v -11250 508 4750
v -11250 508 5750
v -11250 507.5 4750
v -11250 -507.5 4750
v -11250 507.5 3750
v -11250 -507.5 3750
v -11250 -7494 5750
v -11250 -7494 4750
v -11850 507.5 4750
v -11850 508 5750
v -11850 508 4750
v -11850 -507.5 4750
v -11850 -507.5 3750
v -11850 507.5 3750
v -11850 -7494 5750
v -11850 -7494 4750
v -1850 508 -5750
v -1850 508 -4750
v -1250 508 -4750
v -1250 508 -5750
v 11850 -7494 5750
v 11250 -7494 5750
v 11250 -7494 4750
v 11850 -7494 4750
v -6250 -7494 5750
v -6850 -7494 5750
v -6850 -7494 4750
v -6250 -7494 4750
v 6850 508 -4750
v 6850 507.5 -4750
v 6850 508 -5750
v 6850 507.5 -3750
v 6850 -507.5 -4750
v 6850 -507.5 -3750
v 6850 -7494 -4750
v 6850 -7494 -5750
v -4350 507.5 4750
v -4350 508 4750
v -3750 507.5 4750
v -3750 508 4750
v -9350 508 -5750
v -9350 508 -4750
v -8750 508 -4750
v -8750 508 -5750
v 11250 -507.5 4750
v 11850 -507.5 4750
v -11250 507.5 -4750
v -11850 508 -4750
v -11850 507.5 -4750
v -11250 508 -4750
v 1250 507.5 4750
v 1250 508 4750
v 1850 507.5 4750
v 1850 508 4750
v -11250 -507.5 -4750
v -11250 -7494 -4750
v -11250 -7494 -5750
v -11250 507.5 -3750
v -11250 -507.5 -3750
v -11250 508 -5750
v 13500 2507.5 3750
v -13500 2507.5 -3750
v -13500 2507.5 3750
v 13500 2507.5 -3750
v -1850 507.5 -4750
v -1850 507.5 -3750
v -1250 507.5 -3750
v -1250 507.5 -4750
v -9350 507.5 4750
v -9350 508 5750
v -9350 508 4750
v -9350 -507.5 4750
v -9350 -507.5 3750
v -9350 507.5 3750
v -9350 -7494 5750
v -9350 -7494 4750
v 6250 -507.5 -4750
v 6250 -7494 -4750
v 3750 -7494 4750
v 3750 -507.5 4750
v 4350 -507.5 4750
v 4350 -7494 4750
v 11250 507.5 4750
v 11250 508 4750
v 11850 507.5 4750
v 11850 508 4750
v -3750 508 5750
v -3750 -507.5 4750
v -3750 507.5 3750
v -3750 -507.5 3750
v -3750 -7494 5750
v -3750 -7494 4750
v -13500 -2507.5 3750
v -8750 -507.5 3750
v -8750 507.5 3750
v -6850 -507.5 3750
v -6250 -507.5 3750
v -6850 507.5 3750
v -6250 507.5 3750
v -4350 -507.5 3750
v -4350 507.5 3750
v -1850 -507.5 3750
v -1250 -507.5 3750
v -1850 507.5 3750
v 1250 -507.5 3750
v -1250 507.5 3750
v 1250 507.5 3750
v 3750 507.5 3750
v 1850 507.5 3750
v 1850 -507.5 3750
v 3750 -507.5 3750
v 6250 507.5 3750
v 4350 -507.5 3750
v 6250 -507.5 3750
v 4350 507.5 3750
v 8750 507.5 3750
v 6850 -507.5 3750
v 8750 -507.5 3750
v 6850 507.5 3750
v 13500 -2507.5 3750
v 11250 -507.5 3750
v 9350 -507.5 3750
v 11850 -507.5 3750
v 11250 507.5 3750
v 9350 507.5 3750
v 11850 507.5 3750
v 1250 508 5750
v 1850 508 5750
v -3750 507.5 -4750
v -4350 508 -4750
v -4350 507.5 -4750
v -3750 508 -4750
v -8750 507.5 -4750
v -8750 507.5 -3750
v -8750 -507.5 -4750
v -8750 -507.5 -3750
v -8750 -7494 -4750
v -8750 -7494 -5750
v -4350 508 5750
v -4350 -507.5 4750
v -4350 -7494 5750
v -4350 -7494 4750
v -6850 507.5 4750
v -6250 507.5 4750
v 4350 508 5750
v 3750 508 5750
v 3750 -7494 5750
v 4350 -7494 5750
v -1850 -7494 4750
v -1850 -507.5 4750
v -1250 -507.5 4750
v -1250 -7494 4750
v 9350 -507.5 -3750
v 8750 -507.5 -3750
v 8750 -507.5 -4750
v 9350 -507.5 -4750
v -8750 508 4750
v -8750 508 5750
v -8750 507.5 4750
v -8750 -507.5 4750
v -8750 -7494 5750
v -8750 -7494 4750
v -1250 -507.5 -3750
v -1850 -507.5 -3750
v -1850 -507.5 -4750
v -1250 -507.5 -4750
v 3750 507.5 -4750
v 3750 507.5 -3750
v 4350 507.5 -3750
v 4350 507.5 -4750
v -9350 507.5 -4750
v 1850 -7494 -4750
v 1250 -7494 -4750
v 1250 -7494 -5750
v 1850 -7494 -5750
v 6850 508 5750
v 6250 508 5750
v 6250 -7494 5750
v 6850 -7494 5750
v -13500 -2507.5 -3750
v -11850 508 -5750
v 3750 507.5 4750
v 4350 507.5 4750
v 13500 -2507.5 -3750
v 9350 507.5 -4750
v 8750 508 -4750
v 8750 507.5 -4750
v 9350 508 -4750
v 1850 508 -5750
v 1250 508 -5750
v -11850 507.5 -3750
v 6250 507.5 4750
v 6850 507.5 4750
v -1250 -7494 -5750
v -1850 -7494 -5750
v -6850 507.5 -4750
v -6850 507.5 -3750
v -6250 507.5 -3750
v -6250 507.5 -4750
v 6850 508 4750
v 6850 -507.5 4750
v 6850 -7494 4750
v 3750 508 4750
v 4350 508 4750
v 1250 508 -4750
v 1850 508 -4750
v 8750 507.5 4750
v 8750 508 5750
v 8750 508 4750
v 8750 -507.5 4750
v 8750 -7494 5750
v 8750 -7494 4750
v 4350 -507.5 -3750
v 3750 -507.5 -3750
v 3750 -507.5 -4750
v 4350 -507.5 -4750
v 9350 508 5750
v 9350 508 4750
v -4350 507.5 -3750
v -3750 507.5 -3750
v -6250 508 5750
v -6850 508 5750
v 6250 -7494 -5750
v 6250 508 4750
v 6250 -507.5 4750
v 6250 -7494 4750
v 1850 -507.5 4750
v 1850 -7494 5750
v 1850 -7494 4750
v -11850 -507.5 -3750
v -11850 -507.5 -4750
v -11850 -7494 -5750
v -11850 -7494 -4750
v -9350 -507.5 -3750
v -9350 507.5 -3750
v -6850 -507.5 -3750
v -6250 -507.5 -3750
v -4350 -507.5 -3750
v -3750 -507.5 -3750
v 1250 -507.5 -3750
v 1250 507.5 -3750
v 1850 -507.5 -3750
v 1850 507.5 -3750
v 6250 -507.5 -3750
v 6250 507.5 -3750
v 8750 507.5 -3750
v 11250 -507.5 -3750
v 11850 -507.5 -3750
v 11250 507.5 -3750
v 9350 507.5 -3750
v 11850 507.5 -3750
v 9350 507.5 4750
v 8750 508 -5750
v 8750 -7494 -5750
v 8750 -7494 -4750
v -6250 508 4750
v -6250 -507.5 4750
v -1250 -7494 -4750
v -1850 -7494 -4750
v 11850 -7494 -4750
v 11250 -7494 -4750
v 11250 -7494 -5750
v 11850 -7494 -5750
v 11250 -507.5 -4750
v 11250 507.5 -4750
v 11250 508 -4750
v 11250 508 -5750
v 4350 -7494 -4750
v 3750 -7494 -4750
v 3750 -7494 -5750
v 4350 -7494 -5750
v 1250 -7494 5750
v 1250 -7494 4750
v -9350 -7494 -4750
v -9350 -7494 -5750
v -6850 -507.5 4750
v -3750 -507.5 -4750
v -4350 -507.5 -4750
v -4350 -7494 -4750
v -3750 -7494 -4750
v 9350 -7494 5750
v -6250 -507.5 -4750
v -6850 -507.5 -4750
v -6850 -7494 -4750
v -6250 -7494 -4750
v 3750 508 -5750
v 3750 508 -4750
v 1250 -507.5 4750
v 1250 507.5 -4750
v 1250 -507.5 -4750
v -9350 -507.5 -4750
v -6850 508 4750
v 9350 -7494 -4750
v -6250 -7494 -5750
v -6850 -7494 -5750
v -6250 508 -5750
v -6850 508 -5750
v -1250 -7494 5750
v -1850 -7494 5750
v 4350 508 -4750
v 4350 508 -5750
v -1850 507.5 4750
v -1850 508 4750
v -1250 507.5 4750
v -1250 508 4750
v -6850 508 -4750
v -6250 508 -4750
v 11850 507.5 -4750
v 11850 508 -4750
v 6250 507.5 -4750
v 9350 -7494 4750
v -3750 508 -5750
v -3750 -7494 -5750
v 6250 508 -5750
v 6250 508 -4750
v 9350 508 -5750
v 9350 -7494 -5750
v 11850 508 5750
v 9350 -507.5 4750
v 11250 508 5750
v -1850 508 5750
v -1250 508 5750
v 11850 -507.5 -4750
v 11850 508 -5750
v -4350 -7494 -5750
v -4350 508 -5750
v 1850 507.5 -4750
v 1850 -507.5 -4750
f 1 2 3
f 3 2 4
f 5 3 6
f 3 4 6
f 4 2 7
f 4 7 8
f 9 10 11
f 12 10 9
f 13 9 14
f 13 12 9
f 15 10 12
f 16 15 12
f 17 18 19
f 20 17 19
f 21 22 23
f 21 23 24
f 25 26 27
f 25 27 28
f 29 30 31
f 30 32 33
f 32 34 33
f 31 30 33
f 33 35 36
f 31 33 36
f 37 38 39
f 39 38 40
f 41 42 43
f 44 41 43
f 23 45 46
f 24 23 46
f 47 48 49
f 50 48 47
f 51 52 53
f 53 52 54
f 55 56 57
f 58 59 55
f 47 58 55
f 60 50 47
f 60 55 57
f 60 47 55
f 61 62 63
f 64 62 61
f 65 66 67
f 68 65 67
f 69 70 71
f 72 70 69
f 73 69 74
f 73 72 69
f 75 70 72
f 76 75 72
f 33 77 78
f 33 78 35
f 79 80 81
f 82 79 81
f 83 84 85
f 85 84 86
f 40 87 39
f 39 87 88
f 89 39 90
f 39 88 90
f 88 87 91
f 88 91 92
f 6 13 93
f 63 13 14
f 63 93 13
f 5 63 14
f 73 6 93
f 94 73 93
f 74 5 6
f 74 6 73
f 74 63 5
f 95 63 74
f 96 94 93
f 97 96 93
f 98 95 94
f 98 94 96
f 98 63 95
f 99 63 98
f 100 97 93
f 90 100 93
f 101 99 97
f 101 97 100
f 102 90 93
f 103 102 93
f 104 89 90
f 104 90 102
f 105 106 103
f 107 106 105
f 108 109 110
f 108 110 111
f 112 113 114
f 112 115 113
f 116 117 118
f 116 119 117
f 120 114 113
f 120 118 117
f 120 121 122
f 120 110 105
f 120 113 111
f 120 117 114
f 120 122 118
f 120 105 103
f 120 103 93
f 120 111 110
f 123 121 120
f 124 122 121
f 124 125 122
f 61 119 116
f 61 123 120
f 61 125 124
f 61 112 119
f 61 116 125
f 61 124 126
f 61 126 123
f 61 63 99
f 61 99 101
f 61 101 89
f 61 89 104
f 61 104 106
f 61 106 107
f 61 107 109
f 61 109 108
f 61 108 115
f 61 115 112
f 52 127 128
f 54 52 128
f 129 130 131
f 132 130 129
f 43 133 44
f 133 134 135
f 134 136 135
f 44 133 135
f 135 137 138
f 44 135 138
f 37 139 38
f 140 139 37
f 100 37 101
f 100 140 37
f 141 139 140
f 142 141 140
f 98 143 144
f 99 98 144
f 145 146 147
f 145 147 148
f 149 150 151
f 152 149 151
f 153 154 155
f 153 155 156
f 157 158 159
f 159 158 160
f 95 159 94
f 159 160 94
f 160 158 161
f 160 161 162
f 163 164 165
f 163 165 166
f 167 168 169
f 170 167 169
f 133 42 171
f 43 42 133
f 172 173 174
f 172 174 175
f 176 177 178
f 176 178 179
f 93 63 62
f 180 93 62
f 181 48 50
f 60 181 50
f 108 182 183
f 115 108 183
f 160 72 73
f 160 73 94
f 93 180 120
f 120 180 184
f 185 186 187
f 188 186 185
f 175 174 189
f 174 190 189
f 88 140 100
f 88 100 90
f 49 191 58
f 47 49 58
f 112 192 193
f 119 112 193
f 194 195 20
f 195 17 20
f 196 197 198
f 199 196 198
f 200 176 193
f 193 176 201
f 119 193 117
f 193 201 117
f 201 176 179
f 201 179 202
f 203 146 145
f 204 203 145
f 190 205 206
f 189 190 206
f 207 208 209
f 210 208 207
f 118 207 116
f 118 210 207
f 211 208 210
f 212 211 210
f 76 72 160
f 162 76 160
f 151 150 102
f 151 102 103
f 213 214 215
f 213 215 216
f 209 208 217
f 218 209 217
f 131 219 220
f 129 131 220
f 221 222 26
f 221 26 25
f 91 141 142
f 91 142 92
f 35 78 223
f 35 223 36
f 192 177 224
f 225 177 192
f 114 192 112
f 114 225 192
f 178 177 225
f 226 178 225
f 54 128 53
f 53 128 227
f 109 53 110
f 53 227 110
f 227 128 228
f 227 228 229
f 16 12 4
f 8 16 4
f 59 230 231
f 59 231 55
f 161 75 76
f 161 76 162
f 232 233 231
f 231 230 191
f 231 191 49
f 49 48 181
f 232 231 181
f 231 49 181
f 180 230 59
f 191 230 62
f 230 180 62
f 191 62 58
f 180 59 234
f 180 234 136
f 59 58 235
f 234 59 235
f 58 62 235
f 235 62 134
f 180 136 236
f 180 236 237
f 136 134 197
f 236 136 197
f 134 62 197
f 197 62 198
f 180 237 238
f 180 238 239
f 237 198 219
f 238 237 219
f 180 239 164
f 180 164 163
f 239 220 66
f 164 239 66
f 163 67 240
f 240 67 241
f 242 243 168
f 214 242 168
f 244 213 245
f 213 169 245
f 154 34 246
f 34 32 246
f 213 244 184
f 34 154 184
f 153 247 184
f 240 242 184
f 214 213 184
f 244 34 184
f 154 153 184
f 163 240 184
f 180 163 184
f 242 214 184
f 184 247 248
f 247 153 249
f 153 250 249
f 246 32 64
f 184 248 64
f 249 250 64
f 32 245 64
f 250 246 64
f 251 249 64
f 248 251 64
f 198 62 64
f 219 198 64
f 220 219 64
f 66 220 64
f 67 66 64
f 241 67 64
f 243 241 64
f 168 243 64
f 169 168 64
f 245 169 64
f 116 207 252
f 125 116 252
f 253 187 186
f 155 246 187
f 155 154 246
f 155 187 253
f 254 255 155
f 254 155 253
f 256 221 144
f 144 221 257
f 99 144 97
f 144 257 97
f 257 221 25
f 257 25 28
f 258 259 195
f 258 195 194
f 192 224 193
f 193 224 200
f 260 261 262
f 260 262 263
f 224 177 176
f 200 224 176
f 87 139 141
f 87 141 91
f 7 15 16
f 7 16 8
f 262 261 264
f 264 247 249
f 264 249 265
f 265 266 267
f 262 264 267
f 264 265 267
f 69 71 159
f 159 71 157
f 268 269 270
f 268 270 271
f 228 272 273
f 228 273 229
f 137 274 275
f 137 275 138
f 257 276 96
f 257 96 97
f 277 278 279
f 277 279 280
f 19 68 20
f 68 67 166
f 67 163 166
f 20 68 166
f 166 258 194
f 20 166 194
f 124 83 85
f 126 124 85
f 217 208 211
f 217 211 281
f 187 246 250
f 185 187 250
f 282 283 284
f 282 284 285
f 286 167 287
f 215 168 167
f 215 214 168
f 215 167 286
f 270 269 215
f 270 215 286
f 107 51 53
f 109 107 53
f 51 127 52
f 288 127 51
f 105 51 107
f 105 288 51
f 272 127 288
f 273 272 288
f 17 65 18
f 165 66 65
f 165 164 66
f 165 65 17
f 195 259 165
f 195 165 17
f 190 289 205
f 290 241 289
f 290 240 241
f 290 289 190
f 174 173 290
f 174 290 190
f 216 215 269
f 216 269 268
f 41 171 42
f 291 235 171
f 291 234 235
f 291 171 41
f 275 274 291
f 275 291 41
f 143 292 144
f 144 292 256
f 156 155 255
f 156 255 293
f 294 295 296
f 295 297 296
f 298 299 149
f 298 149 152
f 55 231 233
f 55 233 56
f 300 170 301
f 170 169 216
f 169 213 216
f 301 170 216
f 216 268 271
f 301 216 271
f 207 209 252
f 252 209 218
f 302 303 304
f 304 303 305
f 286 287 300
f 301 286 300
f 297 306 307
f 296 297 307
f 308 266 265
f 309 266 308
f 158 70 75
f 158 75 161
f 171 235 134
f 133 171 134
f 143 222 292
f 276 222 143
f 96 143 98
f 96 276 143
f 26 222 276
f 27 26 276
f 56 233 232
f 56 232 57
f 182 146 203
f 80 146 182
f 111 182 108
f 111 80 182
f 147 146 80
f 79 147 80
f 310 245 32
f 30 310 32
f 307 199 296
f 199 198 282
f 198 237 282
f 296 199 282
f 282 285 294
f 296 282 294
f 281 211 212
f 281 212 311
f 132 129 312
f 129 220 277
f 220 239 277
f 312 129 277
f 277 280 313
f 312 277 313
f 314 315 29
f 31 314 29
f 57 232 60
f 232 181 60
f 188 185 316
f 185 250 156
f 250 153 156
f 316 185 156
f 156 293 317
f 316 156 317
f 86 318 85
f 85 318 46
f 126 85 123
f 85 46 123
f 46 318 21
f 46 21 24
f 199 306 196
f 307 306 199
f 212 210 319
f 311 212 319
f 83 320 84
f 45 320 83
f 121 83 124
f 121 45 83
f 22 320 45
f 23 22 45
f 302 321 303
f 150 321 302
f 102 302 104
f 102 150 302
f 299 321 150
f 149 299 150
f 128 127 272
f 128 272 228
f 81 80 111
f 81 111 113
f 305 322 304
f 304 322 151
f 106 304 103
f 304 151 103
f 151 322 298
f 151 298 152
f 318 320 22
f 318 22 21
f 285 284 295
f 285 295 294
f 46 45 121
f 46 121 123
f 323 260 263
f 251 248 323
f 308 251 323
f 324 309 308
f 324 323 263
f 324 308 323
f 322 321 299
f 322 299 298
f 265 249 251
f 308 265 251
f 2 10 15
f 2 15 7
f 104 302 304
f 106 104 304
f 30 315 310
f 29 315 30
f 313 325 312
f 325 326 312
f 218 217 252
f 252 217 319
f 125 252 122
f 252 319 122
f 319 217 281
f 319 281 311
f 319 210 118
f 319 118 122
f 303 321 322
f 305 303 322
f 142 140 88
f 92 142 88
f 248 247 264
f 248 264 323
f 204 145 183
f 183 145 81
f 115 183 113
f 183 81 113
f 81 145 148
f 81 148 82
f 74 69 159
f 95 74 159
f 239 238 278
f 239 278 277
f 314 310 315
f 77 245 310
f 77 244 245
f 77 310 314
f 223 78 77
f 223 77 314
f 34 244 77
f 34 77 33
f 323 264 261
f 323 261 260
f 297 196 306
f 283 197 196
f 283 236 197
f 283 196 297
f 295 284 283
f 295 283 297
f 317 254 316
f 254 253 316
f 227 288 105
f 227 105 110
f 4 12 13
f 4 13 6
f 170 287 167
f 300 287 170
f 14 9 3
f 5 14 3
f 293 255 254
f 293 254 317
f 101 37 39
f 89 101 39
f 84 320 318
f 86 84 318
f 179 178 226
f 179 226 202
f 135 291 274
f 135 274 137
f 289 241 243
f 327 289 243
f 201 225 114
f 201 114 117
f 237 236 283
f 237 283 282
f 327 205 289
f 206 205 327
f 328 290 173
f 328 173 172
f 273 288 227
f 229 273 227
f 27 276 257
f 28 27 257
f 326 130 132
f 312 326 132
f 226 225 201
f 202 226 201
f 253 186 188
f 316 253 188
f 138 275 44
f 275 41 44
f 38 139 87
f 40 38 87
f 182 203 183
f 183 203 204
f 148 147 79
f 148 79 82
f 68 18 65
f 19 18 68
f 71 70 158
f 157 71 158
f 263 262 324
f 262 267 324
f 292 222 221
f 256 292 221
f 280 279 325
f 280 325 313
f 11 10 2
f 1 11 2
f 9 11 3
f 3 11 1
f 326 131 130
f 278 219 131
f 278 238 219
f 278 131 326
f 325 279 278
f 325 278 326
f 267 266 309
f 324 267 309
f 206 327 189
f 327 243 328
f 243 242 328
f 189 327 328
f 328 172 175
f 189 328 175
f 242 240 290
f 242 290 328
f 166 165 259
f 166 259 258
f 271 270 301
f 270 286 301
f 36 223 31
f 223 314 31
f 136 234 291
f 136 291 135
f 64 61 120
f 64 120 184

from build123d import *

# Parameters (mm, degrees)
BOSS_EXTRUDE3_DEPTH         = 2507.5
BOSS_EXTRUDE6_DEPTH         = 508
BOSS_EXTRUDE6_DEPTH_BACK    = 7494
SKETCH1_14_W                = 600
SKETCH1_14_H                = 1000
BOSS_EXTRUDE6_2_DEPTH       = 508
BOSS_EXTRUDE6_2_DEPTH_BACK  = 7494
BOSS_EXTRUDE6_3_DEPTH       = 508
BOSS_EXTRUDE6_3_DEPTH_BACK  = 7494
BOSS_EXTRUDE6_4_DEPTH       = 508
BOSS_EXTRUDE6_4_DEPTH_BACK  = 7494
BOSS_EXTRUDE6_5_DEPTH       = 508
BOSS_EXTRUDE6_5_DEPTH_BACK  = 7494
BOSS_EXTRUDE6_6_DEPTH       = 508
BOSS_EXTRUDE6_6_DEPTH_BACK  = 7494
BOSS_EXTRUDE6_7_DEPTH       = 508
BOSS_EXTRUDE6_7_DEPTH_BACK  = 7494
BOSS_EXTRUDE6_8_DEPTH       = 508
BOSS_EXTRUDE6_8_DEPTH_BACK  = 7494
BOSS_EXTRUDE6_9_DEPTH       = 508
BOSS_EXTRUDE6_9_DEPTH_BACK  = 7494
BOSS_EXTRUDE6_10_DEPTH      = 508
BOSS_EXTRUDE6_10_DEPTH_BACK = 7494
BOSS_EXTRUDE6_11_DEPTH      = 508
BOSS_EXTRUDE6_11_DEPTH_BACK = 7494
BOSS_EXTRUDE6_12_DEPTH      = 508
BOSS_EXTRUDE6_12_DEPTH_BACK = 7494
BOSS_EXTRUDE6_13_DEPTH      = 508
BOSS_EXTRUDE6_13_DEPTH_BACK = 7494
BOSS_EXTRUDE6_14_DEPTH      = 508
BOSS_EXTRUDE6_14_DEPTH_BACK = 7494
BOSS_EXTRUDE6_15_DEPTH      = 508
BOSS_EXTRUDE6_15_DEPTH_BACK = 7494
BOSS_EXTRUDE6_16_DEPTH      = 508
BOSS_EXTRUDE6_16_DEPTH_BACK = 7494
BOSS_EXTRUDE6_17_DEPTH      = 508
BOSS_EXTRUDE6_17_DEPTH_BACK = 7494
BOSS_EXTRUDE6_18_DEPTH      = 508
BOSS_EXTRUDE6_18_DEPTH_BACK = 7494
BOSS_EXTRUDE6_19_DEPTH      = 508
BOSS_EXTRUDE6_19_DEPTH_BACK = 7494
BOSS_EXTRUDE6_20_DEPTH      = 508
BOSS_EXTRUDE6_20_DEPTH_BACK = 7494
SKETCH1_17_W                = 600
SKETCH1_17_H                = 1000
BOSS_EXTRUDE8_DEPTH         = 507.5


with BuildPart() as part:
    # Sketch1 → Boss-Extrude3 (new, symmetric)
    with BuildSketch(Plane(origin=(0, 0, 0), x_dir=(1, 0, 0), z_dir=(0, 1, 0))):
        Polygon((-13500, 3750), (-13500, -3750), (-11850, -3750), (-11250, -3750), (-9350, -3750), (-8750, -3750), (-6850, -3750), (-6250, -3750), (-4350, -3750), (-3750, -3750), (-1850, -3750), (-1250, -3750), (1250, -3750), (1850, -3750), (3750, -3750), (4350, -3750), (6250, -3750), (6850, -3750), (8750, -3750), (9350, -3750), (11250, -3750), (11850, -3750), (13500, -3750), (13500, 3750), (11850, 3750), (11250, 3750), (9350, 3750), (8750, 3750), (6850, 3750), (6250, 3750), (4350, 3750), (3750, 3750), (1850, 3750), (1250, 3750), (-1250, 3750), (-1850, 3750), (-3750, 3750), (-4350, 3750), (-6250, 3750), (-6850, 3750), (-8750, 3750), (-9350, 3750), (-11250, 3750), (-11850, 3750), align=None)
    extrude(amount=BOSS_EXTRUDE3_DEPTH, both=True)



with BuildPart() as body_2:
    # Sketch1<14> → Boss-Extrude6 (new, two sides: drawn at the far end of the back side and taken through both)
    with BuildSketch(Plane(origin=(0, 0, 0), x_dir=(1, 0, 0), z_dir=(0, 1, 0)).offset(-BOSS_EXTRUDE6_DEPTH_BACK)):
        with Locations((-11550, -5250)):
            Rectangle(SKETCH1_14_W, SKETCH1_14_H)
    extrude(amount=BOSS_EXTRUDE6_DEPTH + BOSS_EXTRUDE6_DEPTH_BACK)


with BuildPart() as body_3:
    # Sketch1<14> → Boss-Extrude6 2 (new, two sides: drawn at the far end of the back side and taken through both)
    with BuildSketch(Plane(origin=(0, 0, 0), x_dir=(1, 0, 0), z_dir=(0, 1, 0)).offset(-BOSS_EXTRUDE6_2_DEPTH_BACK)):
        with Locations((-11550, 5250)):
            Rectangle(SKETCH1_14_W, SKETCH1_14_H)
    extrude(amount=BOSS_EXTRUDE6_2_DEPTH + BOSS_EXTRUDE6_2_DEPTH_BACK)


with BuildPart() as body_4:
    # Sketch1<14> → Boss-Extrude6 3 (new, two sides: drawn at the far end of the back side and taken through both)
    with BuildSketch(Plane(origin=(0, 0, 0), x_dir=(1, 0, 0), z_dir=(0, 1, 0)).offset(-BOSS_EXTRUDE6_3_DEPTH_BACK)):
        with Locations((-9050, -5250)):
            Rectangle(SKETCH1_14_W, SKETCH1_14_H)
    extrude(amount=BOSS_EXTRUDE6_3_DEPTH + BOSS_EXTRUDE6_3_DEPTH_BACK)


with BuildPart() as body_5:
    # Sketch1<14> → Boss-Extrude6 4 (new, two sides: drawn at the far end of the back side and taken through both)
    with BuildSketch(Plane(origin=(0, 0, 0), x_dir=(1, 0, 0), z_dir=(0, 1, 0)).offset(-BOSS_EXTRUDE6_4_DEPTH_BACK)):
        with Locations((-9050, 5250)):
            Rectangle(SKETCH1_14_W, SKETCH1_14_H)
    extrude(amount=BOSS_EXTRUDE6_4_DEPTH + BOSS_EXTRUDE6_4_DEPTH_BACK)


with BuildPart() as body_6:
    # Sketch1<14> → Boss-Extrude6 5 (new, two sides: drawn at the far end of the back side and taken through both)
    with BuildSketch(Plane(origin=(0, 0, 0), x_dir=(1, 0, 0), z_dir=(0, 1, 0)).offset(-BOSS_EXTRUDE6_5_DEPTH_BACK)):
        with Locations((-6550, -5250)):
            Rectangle(SKETCH1_14_W, SKETCH1_14_H)
    extrude(amount=BOSS_EXTRUDE6_5_DEPTH + BOSS_EXTRUDE6_5_DEPTH_BACK)


with BuildPart() as body_7:
    # Sketch1<14> → Boss-Extrude6 6 (new, two sides: drawn at the far end of the back side and taken through both)
    with BuildSketch(Plane(origin=(0, 0, 0), x_dir=(1, 0, 0), z_dir=(0, 1, 0)).offset(-BOSS_EXTRUDE6_6_DEPTH_BACK)):
        with Locations((-6550, 5250)):
            Rectangle(SKETCH1_14_W, SKETCH1_14_H)
    extrude(amount=BOSS_EXTRUDE6_6_DEPTH + BOSS_EXTRUDE6_6_DEPTH_BACK)


with BuildPart() as body_8:
    # Sketch1<14> → Boss-Extrude6 7 (new, two sides: drawn at the far end of the back side and taken through both)
    with BuildSketch(Plane(origin=(0, 0, 0), x_dir=(1, 0, 0), z_dir=(0, 1, 0)).offset(-BOSS_EXTRUDE6_7_DEPTH_BACK)):
        with Locations((-4050, -5250)):
            Rectangle(SKETCH1_14_W, SKETCH1_14_H)
    extrude(amount=BOSS_EXTRUDE6_7_DEPTH + BOSS_EXTRUDE6_7_DEPTH_BACK)


with BuildPart() as body_9:
    # Sketch1<14> → Boss-Extrude6 8 (new, two sides: drawn at the far end of the back side and taken through both)
    with BuildSketch(Plane(origin=(0, 0, 0), x_dir=(1, 0, 0), z_dir=(0, 1, 0)).offset(-BOSS_EXTRUDE6_8_DEPTH_BACK)):
        with Locations((-4050, 5250)):
            Rectangle(SKETCH1_14_W, SKETCH1_14_H)
    extrude(amount=BOSS_EXTRUDE6_8_DEPTH + BOSS_EXTRUDE6_8_DEPTH_BACK)


with BuildPart() as body_10:
    # Sketch1<14> → Boss-Extrude6 9 (new, two sides: drawn at the far end of the back side and taken through both)
    with BuildSketch(Plane(origin=(0, 0, 0), x_dir=(1, 0, 0), z_dir=(0, 1, 0)).offset(-BOSS_EXTRUDE6_9_DEPTH_BACK)):
        with Locations((-1550, -5250)):
            Rectangle(SKETCH1_14_W, SKETCH1_14_H)
    extrude(amount=BOSS_EXTRUDE6_9_DEPTH + BOSS_EXTRUDE6_9_DEPTH_BACK)


with BuildPart() as body_11:
    # Sketch1<14> → Boss-Extrude6 10 (new, two sides: drawn at the far end of the back side and taken through both)
    with BuildSketch(Plane(origin=(0, 0, 0), x_dir=(1, 0, 0), z_dir=(0, 1, 0)).offset(-BOSS_EXTRUDE6_10_DEPTH_BACK)):
        with Locations((-1550, 5250)):
            Rectangle(SKETCH1_14_W, SKETCH1_14_H)
    extrude(amount=BOSS_EXTRUDE6_10_DEPTH + BOSS_EXTRUDE6_10_DEPTH_BACK)


with BuildPart() as body_12:
    # Sketch1<14> → Boss-Extrude6 11 (new, two sides: drawn at the far end of the back side and taken through both)
    with BuildSketch(Plane(origin=(0, 0, 0), x_dir=(1, 0, 0), z_dir=(0, 1, 0)).offset(-BOSS_EXTRUDE6_11_DEPTH_BACK)):
        with Locations((1550, -5250)):
            Rectangle(SKETCH1_14_W, SKETCH1_14_H)
    extrude(amount=BOSS_EXTRUDE6_11_DEPTH + BOSS_EXTRUDE6_11_DEPTH_BACK)


with BuildPart() as body_13:
    # Sketch1<14> → Boss-Extrude6 12 (new, two sides: drawn at the far end of the back side and taken through both)
    with BuildSketch(Plane(origin=(0, 0, 0), x_dir=(1, 0, 0), z_dir=(0, 1, 0)).offset(-BOSS_EXTRUDE6_12_DEPTH_BACK)):
        with Locations((1550, 5250)):
            Rectangle(SKETCH1_14_W, SKETCH1_14_H)
    extrude(amount=BOSS_EXTRUDE6_12_DEPTH + BOSS_EXTRUDE6_12_DEPTH_BACK)


with BuildPart() as body_14:
    # Sketch1<14> → Boss-Extrude6 13 (new, two sides: drawn at the far end of the back side and taken through both)
    with BuildSketch(Plane(origin=(0, 0, 0), x_dir=(1, 0, 0), z_dir=(0, 1, 0)).offset(-BOSS_EXTRUDE6_13_DEPTH_BACK)):
        with Locations((4050, -5250)):
            Rectangle(SKETCH1_14_W, SKETCH1_14_H)
    extrude(amount=BOSS_EXTRUDE6_13_DEPTH + BOSS_EXTRUDE6_13_DEPTH_BACK)


with BuildPart() as body_15:
    # Sketch1<14> → Boss-Extrude6 14 (new, two sides: drawn at the far end of the back side and taken through both)
    with BuildSketch(Plane(origin=(0, 0, 0), x_dir=(1, 0, 0), z_dir=(0, 1, 0)).offset(-BOSS_EXTRUDE6_14_DEPTH_BACK)):
        with Locations((4050, 5250)):
            Rectangle(SKETCH1_14_W, SKETCH1_14_H)
    extrude(amount=BOSS_EXTRUDE6_14_DEPTH + BOSS_EXTRUDE6_14_DEPTH_BACK)


with BuildPart() as body_16:
    # Sketch1<14> → Boss-Extrude6 15 (new, two sides: drawn at the far end of the back side and taken through both)
    with BuildSketch(Plane(origin=(0, 0, 0), x_dir=(1, 0, 0), z_dir=(0, 1, 0)).offset(-BOSS_EXTRUDE6_15_DEPTH_BACK)):
        with Locations((6550, -5250)):
            Rectangle(SKETCH1_14_W, SKETCH1_14_H)
    extrude(amount=BOSS_EXTRUDE6_15_DEPTH + BOSS_EXTRUDE6_15_DEPTH_BACK)


with BuildPart() as body_17:
    # Sketch1<14> → Boss-Extrude6 16 (new, two sides: drawn at the far end of the back side and taken through both)
    with BuildSketch(Plane(origin=(0, 0, 0), x_dir=(1, 0, 0), z_dir=(0, 1, 0)).offset(-BOSS_EXTRUDE6_16_DEPTH_BACK)):
        with Locations((6550, 5250)):
            Rectangle(SKETCH1_14_W, SKETCH1_14_H)
    extrude(amount=BOSS_EXTRUDE6_16_DEPTH + BOSS_EXTRUDE6_16_DEPTH_BACK)


with BuildPart() as body_18:
    # Sketch1<14> → Boss-Extrude6 17 (new, two sides: drawn at the far end of the back side and taken through both)
    with BuildSketch(Plane(origin=(0, 0, 0), x_dir=(1, 0, 0), z_dir=(0, 1, 0)).offset(-BOSS_EXTRUDE6_17_DEPTH_BACK)):
        with Locations((9050, -5250)):
            Rectangle(SKETCH1_14_W, SKETCH1_14_H)
    extrude(amount=BOSS_EXTRUDE6_17_DEPTH + BOSS_EXTRUDE6_17_DEPTH_BACK)


with BuildPart() as body_19:
    # Sketch1<14> → Boss-Extrude6 18 (new, two sides: drawn at the far end of the back side and taken through both)
    with BuildSketch(Plane(origin=(0, 0, 0), x_dir=(1, 0, 0), z_dir=(0, 1, 0)).offset(-BOSS_EXTRUDE6_18_DEPTH_BACK)):
        with Locations((9050, 5250)):
            Rectangle(SKETCH1_14_W, SKETCH1_14_H)
    extrude(amount=BOSS_EXTRUDE6_18_DEPTH + BOSS_EXTRUDE6_18_DEPTH_BACK)


with BuildPart() as body_20:
    # Sketch1<14> → Boss-Extrude6 19 (new, two sides: drawn at the far end of the back side and taken through both)
    with BuildSketch(Plane(origin=(0, 0, 0), x_dir=(1, 0, 0), z_dir=(0, 1, 0)).offset(-BOSS_EXTRUDE6_19_DEPTH_BACK)):
        with Locations((11550, -5250)):
            Rectangle(SKETCH1_14_W, SKETCH1_14_H)
    extrude(amount=BOSS_EXTRUDE6_19_DEPTH + BOSS_EXTRUDE6_19_DEPTH_BACK)


with BuildPart() as body_21:
    # Sketch1<14> → Boss-Extrude6 20 (new, two sides: drawn at the far end of the back side and taken through both)
    with BuildSketch(Plane(origin=(0, 0, 0), x_dir=(1, 0, 0), z_dir=(0, 1, 0)).offset(-BOSS_EXTRUDE6_20_DEPTH_BACK)):
        with Locations((11550, 5250)):
            Rectangle(SKETCH1_14_W, SKETCH1_14_H)
    extrude(amount=BOSS_EXTRUDE6_20_DEPTH + BOSS_EXTRUDE6_20_DEPTH_BACK)


with BuildPart() as part_1:
    add(part.part)

    add(body_2.part)  # Boss-Extrude8 merges body 2

    add(body_3.part)  # Boss-Extrude8 merges body 3

    add(body_4.part)  # Boss-Extrude8 merges body 4

    add(body_5.part)  # Boss-Extrude8 merges body 5

    add(body_6.part)  # Boss-Extrude8 merges body 6

    add(body_7.part)  # Boss-Extrude8 merges body 7

    add(body_8.part)  # Boss-Extrude8 merges body 8

    add(body_9.part)  # Boss-Extrude8 merges body 9

    add(body_10.part)  # Boss-Extrude8 merges body 10

    add(body_11.part)  # Boss-Extrude8 merges body 11

    add(body_12.part)  # Boss-Extrude8 merges body 12

    add(body_13.part)  # Boss-Extrude8 merges body 13

    add(body_14.part)  # Boss-Extrude8 merges body 14

    add(body_15.part)  # Boss-Extrude8 merges body 15

    add(body_16.part)  # Boss-Extrude8 merges body 16

    add(body_17.part)  # Boss-Extrude8 merges body 17

    add(body_18.part)  # Boss-Extrude8 merges body 18

    add(body_19.part)  # Boss-Extrude8 merges body 19

    add(body_20.part)  # Boss-Extrude8 merges body 20

    add(body_21.part)  # Boss-Extrude8 merges body 21
    # Sketch1<17> → Boss-Extrude8 (add, symmetric)
    with BuildSketch(Plane(origin=(0, 0, 0), x_dir=(1, 0, 0), z_dir=(0, 1, 0))):
        with Locations((-11550, -4250)):
            Rectangle(SKETCH1_17_W, SKETCH1_17_H)
        with Locations((-11550, 4250)):
            Rectangle(SKETCH1_17_W, SKETCH1_17_H)
        with Locations((-9050, -4250)):
            Rectangle(SKETCH1_17_W, SKETCH1_17_H)
        with Locations((-9050, 4250)):
            Rectangle(SKETCH1_17_W, SKETCH1_17_H)
        with Locations((-6550, -4250)):
            Rectangle(SKETCH1_17_W, SKETCH1_17_H)
        with Locations((-6550, 4250)):
            Rectangle(SKETCH1_17_W, SKETCH1_17_H)
        with Locations((-4050, -4250)):
            Rectangle(SKETCH1_17_W, SKETCH1_17_H)
        with Locations((-4050, 4250)):
            Rectangle(SKETCH1_17_W, SKETCH1_17_H)
        with Locations((-1550, -4250)):
            Rectangle(SKETCH1_17_W, SKETCH1_17_H)
        with Locations((-1550, 4250)):
            Rectangle(SKETCH1_17_W, SKETCH1_17_H)
        with Locations((1550, -4250)):
            Rectangle(SKETCH1_17_W, SKETCH1_17_H)
        with Locations((1550, 4250)):
            Rectangle(SKETCH1_17_W, SKETCH1_17_H)
        with Locations((4050, -4250)):
            Rectangle(SKETCH1_17_W, SKETCH1_17_H)
        with Locations((4050, 4250)):
            Rectangle(SKETCH1_17_W, SKETCH1_17_H)
        with Locations((6550, -4250)):
            Rectangle(SKETCH1_17_W, SKETCH1_17_H)
        with Locations((6550, 4250)):
            Rectangle(SKETCH1_17_W, SKETCH1_17_H)
        with Locations((9050, -4250)):
            Rectangle(SKETCH1_17_W, SKETCH1_17_H)
        with Locations((9050, 4250)):
            Rectangle(SKETCH1_17_W, SKETCH1_17_H)
        with Locations((11550, -4250)):
            Rectangle(SKETCH1_17_W, SKETCH1_17_H)
        with Locations((11550, 4250)):
            Rectangle(SKETCH1_17_W, SKETCH1_17_H)
    extrude(amount=BOSS_EXTRUDE8_DEPTH, both=True)


solid = part_1.part
